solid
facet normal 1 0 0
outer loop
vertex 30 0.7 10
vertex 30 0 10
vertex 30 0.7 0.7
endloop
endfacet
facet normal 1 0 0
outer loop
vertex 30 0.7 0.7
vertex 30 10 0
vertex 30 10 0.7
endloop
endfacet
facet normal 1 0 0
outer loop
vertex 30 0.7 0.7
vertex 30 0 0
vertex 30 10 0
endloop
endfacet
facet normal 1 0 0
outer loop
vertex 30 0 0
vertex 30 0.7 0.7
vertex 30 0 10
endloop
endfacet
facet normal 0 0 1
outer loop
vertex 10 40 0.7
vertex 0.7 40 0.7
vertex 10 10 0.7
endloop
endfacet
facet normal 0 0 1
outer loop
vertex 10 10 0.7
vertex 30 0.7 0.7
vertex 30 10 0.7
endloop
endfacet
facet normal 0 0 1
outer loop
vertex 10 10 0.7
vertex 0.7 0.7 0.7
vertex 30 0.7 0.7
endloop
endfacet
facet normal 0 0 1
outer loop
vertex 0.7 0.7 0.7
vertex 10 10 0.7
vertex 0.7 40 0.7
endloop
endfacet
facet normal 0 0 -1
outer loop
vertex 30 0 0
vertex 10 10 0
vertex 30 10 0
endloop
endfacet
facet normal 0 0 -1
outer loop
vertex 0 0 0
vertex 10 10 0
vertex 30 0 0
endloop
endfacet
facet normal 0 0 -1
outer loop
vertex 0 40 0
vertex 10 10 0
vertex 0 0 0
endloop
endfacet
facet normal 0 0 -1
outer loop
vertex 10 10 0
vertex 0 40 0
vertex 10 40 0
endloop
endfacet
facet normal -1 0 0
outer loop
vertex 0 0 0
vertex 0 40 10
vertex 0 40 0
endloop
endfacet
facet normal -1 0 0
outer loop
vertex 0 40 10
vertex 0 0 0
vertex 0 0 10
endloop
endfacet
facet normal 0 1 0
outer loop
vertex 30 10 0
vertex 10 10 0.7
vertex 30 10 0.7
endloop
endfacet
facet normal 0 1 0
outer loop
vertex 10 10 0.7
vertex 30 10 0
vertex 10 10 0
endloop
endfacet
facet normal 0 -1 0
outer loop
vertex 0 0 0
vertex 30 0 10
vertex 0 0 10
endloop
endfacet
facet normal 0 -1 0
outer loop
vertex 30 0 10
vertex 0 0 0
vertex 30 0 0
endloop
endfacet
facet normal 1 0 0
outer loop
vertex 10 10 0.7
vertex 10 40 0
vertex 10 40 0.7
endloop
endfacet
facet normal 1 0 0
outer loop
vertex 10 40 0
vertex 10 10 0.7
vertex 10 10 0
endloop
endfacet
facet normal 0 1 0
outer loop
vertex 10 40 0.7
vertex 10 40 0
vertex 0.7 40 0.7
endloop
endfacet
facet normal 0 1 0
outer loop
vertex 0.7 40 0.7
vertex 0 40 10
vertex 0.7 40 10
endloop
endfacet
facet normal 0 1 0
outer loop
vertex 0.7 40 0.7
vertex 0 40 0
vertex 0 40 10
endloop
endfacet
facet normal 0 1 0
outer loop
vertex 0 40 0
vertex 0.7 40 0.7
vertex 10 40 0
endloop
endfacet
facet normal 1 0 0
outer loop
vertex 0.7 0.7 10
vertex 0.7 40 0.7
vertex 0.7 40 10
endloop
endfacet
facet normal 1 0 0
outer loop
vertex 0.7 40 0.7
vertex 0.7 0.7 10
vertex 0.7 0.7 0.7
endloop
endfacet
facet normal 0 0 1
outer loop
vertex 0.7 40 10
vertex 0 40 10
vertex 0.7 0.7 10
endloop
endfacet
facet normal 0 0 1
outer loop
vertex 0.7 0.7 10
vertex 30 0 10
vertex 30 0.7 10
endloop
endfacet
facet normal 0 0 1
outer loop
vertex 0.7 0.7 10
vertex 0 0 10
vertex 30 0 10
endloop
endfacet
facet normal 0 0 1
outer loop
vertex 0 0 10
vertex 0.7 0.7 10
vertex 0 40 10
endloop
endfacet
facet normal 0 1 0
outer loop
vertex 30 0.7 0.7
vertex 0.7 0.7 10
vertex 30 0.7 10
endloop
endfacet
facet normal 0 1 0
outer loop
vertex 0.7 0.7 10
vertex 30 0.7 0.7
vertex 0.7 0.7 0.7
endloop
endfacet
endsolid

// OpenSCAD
/* [Dimensions] */

// preview[view:north east, tilt:top diagonal]

// Thickness
thickness = 0.7;

// Height
z = 10;

// Dimension 1
x = 30;

// Dimension 2
y = 40;

/* [Hidden] */

xd = min(x, y, z);
yd = min(x, y, z);

cube(size = [x,xd,thickness]);
cube(size = [yd,y,thickness]);

cube(size = [thickness,y,z]);
cube(size = [x,thickness,z]);
